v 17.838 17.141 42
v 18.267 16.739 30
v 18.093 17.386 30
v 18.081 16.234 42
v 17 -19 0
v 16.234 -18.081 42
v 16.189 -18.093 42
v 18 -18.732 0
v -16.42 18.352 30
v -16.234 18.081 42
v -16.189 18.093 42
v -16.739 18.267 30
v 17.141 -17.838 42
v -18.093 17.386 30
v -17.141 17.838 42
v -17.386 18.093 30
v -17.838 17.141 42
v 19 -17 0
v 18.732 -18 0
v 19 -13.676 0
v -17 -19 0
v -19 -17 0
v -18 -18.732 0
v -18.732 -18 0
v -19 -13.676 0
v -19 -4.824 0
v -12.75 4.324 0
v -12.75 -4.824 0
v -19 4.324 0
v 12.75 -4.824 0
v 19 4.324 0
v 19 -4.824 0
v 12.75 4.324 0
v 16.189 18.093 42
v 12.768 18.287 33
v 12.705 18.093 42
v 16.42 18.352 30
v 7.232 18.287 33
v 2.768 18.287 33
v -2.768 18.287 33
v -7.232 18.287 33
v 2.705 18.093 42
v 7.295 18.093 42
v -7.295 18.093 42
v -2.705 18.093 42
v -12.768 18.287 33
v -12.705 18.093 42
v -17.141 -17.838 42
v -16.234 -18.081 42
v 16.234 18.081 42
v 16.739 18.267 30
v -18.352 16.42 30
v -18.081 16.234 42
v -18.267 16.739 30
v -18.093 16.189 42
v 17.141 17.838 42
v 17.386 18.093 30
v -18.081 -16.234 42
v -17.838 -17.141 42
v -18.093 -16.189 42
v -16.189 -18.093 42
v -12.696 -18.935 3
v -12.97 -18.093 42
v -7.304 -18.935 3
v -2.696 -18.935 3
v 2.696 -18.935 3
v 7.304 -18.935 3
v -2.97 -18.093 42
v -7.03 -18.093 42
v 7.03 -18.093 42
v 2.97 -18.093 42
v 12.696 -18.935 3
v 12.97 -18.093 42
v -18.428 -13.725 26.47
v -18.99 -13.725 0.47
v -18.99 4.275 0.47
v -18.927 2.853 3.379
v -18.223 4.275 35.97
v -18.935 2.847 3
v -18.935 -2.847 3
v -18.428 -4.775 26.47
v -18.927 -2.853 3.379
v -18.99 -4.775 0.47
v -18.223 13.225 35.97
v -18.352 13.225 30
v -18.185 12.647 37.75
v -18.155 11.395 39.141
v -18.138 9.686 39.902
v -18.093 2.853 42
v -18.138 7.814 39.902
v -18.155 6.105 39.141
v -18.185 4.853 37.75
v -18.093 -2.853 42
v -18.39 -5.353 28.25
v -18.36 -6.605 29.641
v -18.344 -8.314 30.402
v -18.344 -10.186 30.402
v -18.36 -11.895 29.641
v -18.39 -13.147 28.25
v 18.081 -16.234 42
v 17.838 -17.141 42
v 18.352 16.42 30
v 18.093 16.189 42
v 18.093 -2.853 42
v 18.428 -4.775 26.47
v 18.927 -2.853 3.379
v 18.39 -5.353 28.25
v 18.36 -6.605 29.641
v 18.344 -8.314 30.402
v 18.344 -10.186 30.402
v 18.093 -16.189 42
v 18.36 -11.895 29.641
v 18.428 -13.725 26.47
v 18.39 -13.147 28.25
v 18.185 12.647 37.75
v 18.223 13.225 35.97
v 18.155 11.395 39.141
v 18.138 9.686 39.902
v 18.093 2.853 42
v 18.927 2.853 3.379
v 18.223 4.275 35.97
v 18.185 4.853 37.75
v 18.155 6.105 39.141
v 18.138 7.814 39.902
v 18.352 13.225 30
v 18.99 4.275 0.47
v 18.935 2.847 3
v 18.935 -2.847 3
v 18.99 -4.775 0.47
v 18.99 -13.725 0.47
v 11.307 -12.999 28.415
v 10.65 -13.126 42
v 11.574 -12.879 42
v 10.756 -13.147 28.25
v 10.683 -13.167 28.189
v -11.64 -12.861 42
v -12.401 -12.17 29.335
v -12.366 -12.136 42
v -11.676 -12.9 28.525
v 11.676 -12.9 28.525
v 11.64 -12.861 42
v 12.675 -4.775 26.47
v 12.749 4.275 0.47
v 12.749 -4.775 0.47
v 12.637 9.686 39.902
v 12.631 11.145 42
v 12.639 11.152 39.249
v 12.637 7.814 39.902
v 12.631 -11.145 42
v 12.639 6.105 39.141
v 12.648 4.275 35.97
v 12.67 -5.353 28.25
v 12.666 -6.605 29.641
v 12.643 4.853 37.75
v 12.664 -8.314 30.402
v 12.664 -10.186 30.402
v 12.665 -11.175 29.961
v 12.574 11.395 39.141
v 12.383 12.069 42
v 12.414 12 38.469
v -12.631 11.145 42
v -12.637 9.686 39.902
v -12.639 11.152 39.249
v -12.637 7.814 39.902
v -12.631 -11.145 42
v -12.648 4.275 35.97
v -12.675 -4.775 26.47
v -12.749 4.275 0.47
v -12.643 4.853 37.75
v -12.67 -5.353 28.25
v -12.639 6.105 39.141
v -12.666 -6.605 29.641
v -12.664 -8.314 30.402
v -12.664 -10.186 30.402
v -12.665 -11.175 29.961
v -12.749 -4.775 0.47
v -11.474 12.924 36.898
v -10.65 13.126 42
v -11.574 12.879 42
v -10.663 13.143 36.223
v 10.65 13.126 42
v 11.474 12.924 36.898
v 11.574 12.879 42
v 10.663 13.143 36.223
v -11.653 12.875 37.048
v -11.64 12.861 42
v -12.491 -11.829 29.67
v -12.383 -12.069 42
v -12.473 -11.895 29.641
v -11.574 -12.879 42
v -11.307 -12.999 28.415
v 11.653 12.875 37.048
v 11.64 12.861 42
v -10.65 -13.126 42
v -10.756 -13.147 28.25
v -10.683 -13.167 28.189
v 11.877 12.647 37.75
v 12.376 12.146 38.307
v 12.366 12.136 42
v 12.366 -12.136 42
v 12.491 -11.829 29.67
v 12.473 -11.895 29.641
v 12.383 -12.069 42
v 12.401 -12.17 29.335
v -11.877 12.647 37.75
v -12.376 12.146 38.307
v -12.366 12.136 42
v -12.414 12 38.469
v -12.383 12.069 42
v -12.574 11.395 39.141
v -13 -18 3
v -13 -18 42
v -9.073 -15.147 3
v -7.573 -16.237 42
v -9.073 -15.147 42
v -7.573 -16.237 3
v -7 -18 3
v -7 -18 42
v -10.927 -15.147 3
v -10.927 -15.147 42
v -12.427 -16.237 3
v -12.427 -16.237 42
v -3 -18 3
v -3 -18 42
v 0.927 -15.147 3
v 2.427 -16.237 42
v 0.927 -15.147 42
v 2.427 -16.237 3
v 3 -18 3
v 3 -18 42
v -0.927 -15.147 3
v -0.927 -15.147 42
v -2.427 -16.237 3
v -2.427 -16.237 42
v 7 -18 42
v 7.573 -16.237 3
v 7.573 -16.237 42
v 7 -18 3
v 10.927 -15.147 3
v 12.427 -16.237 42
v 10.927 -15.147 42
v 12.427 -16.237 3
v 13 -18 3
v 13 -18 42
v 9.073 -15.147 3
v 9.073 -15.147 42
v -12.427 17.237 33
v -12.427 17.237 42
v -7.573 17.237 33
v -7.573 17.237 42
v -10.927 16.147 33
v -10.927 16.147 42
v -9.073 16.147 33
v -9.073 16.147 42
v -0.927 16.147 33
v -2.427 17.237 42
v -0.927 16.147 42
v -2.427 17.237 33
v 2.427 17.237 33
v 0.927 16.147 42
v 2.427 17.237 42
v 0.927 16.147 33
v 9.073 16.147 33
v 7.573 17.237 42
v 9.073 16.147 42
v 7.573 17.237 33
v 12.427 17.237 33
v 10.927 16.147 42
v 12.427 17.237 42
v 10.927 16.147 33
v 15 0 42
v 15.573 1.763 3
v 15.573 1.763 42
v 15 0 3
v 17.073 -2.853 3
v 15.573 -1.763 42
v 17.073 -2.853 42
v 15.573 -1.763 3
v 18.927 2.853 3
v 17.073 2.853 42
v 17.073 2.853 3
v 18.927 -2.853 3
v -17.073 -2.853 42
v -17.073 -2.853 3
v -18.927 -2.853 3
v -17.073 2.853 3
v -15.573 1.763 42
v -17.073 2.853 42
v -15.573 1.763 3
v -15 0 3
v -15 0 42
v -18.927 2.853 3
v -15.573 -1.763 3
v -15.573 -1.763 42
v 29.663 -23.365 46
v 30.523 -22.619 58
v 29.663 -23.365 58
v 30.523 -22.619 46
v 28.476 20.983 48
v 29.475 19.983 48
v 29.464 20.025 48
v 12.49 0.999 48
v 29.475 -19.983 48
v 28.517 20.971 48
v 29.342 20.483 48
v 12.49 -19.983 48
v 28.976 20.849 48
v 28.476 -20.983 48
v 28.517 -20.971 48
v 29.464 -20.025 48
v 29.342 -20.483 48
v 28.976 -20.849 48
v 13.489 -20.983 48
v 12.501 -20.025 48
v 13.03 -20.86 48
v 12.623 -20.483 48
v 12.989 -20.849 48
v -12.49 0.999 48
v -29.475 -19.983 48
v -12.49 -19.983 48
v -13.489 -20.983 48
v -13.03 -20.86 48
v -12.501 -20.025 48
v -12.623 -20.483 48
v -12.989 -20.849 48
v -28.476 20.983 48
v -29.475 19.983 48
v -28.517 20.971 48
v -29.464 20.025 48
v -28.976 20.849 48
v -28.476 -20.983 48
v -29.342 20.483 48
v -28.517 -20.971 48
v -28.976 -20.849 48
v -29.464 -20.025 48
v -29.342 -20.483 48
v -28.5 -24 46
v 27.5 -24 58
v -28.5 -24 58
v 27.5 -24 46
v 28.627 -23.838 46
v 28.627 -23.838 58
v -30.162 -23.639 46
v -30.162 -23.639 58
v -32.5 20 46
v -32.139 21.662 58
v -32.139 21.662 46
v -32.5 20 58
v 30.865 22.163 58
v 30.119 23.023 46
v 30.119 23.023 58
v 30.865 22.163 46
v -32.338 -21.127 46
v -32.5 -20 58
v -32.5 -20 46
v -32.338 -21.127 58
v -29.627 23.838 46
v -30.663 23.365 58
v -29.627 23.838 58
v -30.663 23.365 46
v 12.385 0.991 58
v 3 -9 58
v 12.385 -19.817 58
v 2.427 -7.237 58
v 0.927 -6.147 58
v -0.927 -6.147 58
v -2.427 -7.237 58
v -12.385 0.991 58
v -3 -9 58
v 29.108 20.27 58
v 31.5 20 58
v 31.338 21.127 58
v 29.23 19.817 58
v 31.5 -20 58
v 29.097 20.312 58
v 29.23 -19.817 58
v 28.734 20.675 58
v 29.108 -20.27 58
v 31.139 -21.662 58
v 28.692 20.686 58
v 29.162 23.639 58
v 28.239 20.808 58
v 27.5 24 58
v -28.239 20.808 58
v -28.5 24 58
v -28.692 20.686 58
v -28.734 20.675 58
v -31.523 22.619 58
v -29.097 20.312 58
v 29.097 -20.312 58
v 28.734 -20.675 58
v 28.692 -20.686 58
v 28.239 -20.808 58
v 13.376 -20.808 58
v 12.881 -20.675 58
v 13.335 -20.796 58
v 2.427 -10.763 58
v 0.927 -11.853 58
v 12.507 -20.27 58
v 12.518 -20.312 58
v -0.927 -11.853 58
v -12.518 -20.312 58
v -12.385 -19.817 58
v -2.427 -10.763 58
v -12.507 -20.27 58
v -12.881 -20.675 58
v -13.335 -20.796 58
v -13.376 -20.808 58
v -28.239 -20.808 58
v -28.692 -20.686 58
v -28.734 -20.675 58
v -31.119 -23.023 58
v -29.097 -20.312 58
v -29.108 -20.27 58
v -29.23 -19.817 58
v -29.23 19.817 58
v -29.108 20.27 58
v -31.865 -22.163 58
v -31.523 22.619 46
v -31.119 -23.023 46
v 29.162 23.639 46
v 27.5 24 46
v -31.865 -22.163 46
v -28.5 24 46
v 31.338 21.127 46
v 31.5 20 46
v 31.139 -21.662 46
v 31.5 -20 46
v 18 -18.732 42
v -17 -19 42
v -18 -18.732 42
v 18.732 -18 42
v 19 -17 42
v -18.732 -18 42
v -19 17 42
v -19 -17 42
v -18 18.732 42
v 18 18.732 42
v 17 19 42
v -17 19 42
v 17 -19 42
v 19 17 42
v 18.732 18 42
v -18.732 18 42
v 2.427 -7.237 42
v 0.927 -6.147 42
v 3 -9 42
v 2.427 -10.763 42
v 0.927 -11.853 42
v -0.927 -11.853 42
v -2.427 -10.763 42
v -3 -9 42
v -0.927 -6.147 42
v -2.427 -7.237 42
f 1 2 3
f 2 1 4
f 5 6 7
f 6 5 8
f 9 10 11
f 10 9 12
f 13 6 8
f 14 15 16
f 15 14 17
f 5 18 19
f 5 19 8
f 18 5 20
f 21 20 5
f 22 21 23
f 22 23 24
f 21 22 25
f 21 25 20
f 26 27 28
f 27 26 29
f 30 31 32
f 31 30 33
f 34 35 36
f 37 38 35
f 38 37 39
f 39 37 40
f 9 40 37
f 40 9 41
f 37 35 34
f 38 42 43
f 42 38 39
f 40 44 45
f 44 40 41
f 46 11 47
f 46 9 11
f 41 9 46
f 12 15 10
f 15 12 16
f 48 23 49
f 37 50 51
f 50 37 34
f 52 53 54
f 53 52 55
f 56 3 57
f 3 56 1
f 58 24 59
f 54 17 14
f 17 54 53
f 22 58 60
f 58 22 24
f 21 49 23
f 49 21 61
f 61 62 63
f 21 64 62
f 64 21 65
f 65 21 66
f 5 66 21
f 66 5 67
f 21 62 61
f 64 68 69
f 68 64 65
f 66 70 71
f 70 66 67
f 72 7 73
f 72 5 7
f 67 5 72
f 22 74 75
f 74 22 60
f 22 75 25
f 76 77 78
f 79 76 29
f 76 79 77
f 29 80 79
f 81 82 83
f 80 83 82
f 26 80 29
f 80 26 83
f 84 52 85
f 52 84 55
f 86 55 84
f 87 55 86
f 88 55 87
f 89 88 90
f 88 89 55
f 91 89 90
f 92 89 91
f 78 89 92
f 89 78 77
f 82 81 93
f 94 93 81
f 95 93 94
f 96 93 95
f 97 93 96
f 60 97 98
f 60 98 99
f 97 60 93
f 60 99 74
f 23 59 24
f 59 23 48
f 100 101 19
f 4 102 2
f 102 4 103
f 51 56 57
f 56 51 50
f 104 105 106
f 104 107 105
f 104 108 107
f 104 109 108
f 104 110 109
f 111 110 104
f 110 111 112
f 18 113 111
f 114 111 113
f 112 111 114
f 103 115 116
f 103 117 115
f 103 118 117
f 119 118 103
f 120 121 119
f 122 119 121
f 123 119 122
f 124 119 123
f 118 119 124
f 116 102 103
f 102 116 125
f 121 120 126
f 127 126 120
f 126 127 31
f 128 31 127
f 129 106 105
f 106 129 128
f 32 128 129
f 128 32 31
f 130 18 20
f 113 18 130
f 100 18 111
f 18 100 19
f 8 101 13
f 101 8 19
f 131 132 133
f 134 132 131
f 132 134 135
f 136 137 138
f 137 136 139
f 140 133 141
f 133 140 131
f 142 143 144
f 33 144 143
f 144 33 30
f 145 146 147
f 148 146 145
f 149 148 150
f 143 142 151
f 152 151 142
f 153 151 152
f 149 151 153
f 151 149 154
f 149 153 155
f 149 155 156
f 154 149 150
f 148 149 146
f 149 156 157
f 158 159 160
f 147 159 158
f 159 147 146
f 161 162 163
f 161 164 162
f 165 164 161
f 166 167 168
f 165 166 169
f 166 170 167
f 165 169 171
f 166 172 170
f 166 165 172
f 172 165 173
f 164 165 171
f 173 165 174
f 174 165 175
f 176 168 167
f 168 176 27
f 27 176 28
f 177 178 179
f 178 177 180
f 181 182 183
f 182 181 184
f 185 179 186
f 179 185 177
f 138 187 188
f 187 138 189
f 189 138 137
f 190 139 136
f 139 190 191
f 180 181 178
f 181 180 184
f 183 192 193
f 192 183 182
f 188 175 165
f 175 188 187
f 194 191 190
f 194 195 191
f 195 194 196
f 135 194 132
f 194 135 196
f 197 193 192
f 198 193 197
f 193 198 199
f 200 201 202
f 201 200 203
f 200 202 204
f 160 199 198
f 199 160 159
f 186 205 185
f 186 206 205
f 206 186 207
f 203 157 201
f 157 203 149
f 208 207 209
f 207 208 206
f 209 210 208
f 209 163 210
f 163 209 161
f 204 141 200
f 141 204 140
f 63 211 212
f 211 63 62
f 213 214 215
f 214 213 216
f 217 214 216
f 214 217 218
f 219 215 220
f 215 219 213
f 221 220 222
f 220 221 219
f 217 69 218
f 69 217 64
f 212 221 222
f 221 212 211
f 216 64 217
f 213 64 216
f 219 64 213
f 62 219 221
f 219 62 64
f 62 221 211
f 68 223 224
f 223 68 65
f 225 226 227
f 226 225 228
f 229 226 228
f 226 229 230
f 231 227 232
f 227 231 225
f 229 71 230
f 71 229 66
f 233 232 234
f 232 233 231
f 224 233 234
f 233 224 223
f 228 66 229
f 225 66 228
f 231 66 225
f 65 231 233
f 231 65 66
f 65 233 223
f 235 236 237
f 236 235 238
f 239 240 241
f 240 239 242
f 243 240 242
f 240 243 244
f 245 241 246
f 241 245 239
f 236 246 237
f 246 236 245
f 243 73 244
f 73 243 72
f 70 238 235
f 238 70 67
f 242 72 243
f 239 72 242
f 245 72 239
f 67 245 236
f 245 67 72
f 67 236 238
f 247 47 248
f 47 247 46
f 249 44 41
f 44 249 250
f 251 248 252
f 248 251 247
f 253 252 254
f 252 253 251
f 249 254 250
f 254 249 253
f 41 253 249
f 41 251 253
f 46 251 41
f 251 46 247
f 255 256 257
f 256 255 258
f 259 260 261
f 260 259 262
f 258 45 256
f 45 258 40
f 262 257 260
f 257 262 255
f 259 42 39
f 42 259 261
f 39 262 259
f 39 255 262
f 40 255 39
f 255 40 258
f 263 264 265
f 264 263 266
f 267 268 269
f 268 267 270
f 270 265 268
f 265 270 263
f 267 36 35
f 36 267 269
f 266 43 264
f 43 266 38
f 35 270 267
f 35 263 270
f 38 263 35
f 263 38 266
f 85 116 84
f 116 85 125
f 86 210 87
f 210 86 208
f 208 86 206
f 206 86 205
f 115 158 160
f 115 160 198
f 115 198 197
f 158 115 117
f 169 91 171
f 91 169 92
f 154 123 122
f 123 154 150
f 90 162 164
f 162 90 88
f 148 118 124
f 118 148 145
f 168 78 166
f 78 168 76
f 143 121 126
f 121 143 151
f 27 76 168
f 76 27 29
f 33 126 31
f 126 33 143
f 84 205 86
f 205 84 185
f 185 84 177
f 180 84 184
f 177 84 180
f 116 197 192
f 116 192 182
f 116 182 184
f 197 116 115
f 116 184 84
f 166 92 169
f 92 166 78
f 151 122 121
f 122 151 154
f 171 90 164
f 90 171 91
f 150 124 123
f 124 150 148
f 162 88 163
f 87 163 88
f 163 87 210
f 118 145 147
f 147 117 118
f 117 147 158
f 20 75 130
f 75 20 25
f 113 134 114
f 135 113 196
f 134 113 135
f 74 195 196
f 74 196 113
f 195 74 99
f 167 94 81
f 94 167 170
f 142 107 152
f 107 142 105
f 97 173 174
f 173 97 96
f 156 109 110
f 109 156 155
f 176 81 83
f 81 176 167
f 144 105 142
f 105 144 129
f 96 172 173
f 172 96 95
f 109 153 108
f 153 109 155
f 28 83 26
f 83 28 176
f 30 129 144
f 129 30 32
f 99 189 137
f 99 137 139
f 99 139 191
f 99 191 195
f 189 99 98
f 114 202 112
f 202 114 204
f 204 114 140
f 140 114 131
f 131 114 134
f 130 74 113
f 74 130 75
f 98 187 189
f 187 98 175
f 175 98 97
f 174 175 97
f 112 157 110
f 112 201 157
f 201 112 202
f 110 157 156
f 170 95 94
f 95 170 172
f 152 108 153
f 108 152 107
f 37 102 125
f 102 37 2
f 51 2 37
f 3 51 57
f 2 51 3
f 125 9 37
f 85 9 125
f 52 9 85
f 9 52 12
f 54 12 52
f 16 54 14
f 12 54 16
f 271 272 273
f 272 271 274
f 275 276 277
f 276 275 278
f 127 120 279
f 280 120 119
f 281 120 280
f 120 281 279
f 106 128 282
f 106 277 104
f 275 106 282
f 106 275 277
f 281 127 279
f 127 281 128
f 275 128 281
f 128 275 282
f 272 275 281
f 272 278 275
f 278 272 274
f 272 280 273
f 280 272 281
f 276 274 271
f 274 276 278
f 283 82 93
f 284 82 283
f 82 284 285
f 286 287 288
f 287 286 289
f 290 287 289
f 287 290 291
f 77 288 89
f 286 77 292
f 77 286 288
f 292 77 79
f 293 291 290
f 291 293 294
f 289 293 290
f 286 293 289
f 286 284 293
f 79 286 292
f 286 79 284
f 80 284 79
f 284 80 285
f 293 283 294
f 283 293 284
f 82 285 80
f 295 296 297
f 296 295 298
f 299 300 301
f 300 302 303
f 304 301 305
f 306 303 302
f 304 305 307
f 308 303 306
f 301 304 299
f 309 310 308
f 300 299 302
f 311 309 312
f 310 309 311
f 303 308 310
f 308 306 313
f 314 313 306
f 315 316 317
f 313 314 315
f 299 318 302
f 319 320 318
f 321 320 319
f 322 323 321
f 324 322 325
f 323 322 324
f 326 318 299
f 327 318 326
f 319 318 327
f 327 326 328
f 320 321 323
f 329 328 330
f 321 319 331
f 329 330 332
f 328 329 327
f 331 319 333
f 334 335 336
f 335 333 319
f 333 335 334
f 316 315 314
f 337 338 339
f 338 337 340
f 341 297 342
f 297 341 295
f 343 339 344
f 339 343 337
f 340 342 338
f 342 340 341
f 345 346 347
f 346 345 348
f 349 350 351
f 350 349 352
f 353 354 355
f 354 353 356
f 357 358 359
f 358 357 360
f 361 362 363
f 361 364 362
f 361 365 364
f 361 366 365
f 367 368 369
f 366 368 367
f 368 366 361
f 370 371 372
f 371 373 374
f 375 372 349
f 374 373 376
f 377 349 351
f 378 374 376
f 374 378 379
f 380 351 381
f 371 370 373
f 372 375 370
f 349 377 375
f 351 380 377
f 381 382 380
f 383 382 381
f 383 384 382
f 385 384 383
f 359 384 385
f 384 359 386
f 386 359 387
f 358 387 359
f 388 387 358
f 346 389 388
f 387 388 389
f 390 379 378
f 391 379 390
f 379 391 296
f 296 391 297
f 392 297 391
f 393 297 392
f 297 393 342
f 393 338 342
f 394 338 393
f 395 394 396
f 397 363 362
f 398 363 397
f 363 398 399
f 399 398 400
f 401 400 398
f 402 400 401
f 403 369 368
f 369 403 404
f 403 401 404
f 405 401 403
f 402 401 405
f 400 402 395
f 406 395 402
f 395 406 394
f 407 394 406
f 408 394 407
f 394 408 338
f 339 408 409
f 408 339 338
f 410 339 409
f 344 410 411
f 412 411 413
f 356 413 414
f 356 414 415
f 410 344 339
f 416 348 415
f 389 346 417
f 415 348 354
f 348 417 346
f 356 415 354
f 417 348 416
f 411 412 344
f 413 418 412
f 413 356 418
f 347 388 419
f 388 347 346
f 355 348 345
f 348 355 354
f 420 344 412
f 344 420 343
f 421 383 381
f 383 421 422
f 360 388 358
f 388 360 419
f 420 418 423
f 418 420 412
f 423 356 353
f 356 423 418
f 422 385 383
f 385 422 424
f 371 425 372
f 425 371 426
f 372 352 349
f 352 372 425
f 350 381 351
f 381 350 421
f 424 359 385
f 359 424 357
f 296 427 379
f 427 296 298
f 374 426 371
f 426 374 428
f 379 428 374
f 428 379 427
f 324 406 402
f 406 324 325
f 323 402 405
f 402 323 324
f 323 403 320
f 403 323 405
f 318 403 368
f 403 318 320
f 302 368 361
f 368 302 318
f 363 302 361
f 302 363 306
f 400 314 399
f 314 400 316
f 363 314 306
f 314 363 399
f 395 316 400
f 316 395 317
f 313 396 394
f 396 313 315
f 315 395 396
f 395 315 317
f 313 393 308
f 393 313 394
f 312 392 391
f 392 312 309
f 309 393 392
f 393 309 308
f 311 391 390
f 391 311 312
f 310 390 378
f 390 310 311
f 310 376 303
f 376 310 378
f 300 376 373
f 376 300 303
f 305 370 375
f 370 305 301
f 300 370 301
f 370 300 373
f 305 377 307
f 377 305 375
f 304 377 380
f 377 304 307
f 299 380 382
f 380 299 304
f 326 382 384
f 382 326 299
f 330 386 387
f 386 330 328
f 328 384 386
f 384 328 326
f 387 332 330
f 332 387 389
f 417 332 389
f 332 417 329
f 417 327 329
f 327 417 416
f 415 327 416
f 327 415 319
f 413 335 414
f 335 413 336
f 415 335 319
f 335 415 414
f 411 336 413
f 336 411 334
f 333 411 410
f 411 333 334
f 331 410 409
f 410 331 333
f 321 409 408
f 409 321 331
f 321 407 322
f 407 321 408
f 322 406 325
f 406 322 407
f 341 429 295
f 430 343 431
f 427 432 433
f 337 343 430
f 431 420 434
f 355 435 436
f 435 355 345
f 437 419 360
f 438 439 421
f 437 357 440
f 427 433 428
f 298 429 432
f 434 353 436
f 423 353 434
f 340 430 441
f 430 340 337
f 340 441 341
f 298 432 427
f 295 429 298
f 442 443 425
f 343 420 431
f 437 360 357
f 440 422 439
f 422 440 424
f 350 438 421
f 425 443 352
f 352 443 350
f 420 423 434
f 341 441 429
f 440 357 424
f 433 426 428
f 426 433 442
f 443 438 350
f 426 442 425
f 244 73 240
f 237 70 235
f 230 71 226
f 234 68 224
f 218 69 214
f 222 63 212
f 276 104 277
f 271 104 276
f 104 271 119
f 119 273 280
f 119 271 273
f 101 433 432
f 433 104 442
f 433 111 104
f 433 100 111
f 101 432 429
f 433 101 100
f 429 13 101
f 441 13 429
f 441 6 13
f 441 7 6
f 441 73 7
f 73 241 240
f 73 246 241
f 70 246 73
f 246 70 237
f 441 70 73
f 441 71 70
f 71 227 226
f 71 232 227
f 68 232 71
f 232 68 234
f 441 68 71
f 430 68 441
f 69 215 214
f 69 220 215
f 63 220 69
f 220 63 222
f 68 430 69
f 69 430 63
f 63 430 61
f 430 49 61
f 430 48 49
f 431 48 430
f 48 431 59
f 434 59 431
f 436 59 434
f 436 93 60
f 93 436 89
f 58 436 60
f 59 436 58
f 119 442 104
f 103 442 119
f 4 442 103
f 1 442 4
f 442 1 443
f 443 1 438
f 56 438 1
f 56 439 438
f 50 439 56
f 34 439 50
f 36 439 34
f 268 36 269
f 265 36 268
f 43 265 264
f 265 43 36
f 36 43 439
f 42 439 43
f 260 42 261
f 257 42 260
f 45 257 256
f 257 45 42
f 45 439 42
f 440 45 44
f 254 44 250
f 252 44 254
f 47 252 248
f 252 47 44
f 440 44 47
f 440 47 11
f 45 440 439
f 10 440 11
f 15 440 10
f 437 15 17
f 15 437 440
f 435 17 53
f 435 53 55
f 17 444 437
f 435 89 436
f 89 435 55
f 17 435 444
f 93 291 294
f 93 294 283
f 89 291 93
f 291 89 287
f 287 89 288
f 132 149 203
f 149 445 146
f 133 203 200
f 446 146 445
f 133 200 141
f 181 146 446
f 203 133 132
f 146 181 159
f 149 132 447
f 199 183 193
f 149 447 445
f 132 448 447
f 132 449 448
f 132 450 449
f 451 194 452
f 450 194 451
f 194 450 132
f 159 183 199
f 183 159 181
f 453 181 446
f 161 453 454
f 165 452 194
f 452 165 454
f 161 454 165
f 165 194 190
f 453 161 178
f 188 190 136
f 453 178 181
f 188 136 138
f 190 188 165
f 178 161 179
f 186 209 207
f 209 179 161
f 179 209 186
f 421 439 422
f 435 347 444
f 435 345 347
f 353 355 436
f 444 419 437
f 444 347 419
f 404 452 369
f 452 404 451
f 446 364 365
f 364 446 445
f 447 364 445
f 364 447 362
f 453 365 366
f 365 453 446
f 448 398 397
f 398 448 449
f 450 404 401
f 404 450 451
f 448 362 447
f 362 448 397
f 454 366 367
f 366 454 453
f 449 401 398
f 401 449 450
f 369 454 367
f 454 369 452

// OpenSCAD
// Attach aligator arm to panavise.

H=44;

difference(){
    // lower boss fits over vise head
    difference(){
        linear_extrude(height=H,scale=0.95)
        offset(r=2,$fn=12)
        square(size=[34,34],center=true);

        linear_extrude(height=H+1,scale=0.99)
        offset(r=2,$fn=12)
        square(size=[25.5-4,26.5-4],center=true);
    }

    // slot for the back rails
    hull(){
        translate([0,13.25-4.5,H-8.5]) rotate([0,90,0])
        cylinder(r=4.5,h=50,center=true);
        
        translate([0,13.25-4.5,0]) rotate([0,90,0])
        cylinder(r=4.5,h=50,center=true);
    }    
    
        // slot for the screw
    hull(){
        translate([0,-13.25+4,H-18]) rotate([0,90,0])
        cylinder(r=4.5,h=50,center=true);
        
        translate([0,-13.25+4,0]) rotate([0,90,0])
        cylinder(r=4.5,h=50,center=true);
    }    

        // shorten the front leg
    translate([-20,10,-1])
    linear_extrude(height=31)
    square(size=[56,40]);
    
    // rib the sidewalls back
    for(i=[-1:1:1]){
        translate([10*i,-18,28]) rotate([0,0,0])
        cylinder(r=3,h=50,center=true);
    }
    // rib the sidewalls front
    for(i=[-1:1:1]){
        translate([10*i,+19,58]) rotate([0,0,0])
        cylinder(r=3,h=50,center=true);
    }
    // rib the sidewalls
        translate([18,0,28]) rotate([0,0,0])
        cylinder(r=3,h=50,center=true);
        translate([-18,0,28]) rotate([0,0,0])
        cylinder(r=3,h=50,center=true);
    
}
difference(){
union(){
// upper boss holds the aligator arm    
difference(){
    translate([-57/2,-40/2,H+4])
    linear_extrude(height=10)
    offset(r=4,$fn=22)
    square(size=[56,40]);


pa1=[ [0,0], [15,0], [15,22], [42,22], [42,0], [57,0],
    [57,40], [0,40] ];
    
    translate([0,0,H+3]) rotate([0,0,0])
    linear_extrude(height=12,scale=0.99){
        offset(r=1,$fn=12)
        translate([-57/2,-40/2])
        polygon(points=pa1);
    }

}
    
    hull(){
    // landing on upper
    translate([-57/2,-40/2,H+2])
    linear_extrude(height=2)
    offset(r=4,$fn=22)
    square(size=[56,40]);
    // lower land
    translate([0,0,H-2])
    linear_extrude(height=1,scale=1)
    offset(r=2,$fn=12)
    square(size=[34,34],center=true);
    }
    
}    // end union

// Bolt hole
        translate([0,-9,28]) 
        cylinder(r=3,h=H+10);
} // end diff
